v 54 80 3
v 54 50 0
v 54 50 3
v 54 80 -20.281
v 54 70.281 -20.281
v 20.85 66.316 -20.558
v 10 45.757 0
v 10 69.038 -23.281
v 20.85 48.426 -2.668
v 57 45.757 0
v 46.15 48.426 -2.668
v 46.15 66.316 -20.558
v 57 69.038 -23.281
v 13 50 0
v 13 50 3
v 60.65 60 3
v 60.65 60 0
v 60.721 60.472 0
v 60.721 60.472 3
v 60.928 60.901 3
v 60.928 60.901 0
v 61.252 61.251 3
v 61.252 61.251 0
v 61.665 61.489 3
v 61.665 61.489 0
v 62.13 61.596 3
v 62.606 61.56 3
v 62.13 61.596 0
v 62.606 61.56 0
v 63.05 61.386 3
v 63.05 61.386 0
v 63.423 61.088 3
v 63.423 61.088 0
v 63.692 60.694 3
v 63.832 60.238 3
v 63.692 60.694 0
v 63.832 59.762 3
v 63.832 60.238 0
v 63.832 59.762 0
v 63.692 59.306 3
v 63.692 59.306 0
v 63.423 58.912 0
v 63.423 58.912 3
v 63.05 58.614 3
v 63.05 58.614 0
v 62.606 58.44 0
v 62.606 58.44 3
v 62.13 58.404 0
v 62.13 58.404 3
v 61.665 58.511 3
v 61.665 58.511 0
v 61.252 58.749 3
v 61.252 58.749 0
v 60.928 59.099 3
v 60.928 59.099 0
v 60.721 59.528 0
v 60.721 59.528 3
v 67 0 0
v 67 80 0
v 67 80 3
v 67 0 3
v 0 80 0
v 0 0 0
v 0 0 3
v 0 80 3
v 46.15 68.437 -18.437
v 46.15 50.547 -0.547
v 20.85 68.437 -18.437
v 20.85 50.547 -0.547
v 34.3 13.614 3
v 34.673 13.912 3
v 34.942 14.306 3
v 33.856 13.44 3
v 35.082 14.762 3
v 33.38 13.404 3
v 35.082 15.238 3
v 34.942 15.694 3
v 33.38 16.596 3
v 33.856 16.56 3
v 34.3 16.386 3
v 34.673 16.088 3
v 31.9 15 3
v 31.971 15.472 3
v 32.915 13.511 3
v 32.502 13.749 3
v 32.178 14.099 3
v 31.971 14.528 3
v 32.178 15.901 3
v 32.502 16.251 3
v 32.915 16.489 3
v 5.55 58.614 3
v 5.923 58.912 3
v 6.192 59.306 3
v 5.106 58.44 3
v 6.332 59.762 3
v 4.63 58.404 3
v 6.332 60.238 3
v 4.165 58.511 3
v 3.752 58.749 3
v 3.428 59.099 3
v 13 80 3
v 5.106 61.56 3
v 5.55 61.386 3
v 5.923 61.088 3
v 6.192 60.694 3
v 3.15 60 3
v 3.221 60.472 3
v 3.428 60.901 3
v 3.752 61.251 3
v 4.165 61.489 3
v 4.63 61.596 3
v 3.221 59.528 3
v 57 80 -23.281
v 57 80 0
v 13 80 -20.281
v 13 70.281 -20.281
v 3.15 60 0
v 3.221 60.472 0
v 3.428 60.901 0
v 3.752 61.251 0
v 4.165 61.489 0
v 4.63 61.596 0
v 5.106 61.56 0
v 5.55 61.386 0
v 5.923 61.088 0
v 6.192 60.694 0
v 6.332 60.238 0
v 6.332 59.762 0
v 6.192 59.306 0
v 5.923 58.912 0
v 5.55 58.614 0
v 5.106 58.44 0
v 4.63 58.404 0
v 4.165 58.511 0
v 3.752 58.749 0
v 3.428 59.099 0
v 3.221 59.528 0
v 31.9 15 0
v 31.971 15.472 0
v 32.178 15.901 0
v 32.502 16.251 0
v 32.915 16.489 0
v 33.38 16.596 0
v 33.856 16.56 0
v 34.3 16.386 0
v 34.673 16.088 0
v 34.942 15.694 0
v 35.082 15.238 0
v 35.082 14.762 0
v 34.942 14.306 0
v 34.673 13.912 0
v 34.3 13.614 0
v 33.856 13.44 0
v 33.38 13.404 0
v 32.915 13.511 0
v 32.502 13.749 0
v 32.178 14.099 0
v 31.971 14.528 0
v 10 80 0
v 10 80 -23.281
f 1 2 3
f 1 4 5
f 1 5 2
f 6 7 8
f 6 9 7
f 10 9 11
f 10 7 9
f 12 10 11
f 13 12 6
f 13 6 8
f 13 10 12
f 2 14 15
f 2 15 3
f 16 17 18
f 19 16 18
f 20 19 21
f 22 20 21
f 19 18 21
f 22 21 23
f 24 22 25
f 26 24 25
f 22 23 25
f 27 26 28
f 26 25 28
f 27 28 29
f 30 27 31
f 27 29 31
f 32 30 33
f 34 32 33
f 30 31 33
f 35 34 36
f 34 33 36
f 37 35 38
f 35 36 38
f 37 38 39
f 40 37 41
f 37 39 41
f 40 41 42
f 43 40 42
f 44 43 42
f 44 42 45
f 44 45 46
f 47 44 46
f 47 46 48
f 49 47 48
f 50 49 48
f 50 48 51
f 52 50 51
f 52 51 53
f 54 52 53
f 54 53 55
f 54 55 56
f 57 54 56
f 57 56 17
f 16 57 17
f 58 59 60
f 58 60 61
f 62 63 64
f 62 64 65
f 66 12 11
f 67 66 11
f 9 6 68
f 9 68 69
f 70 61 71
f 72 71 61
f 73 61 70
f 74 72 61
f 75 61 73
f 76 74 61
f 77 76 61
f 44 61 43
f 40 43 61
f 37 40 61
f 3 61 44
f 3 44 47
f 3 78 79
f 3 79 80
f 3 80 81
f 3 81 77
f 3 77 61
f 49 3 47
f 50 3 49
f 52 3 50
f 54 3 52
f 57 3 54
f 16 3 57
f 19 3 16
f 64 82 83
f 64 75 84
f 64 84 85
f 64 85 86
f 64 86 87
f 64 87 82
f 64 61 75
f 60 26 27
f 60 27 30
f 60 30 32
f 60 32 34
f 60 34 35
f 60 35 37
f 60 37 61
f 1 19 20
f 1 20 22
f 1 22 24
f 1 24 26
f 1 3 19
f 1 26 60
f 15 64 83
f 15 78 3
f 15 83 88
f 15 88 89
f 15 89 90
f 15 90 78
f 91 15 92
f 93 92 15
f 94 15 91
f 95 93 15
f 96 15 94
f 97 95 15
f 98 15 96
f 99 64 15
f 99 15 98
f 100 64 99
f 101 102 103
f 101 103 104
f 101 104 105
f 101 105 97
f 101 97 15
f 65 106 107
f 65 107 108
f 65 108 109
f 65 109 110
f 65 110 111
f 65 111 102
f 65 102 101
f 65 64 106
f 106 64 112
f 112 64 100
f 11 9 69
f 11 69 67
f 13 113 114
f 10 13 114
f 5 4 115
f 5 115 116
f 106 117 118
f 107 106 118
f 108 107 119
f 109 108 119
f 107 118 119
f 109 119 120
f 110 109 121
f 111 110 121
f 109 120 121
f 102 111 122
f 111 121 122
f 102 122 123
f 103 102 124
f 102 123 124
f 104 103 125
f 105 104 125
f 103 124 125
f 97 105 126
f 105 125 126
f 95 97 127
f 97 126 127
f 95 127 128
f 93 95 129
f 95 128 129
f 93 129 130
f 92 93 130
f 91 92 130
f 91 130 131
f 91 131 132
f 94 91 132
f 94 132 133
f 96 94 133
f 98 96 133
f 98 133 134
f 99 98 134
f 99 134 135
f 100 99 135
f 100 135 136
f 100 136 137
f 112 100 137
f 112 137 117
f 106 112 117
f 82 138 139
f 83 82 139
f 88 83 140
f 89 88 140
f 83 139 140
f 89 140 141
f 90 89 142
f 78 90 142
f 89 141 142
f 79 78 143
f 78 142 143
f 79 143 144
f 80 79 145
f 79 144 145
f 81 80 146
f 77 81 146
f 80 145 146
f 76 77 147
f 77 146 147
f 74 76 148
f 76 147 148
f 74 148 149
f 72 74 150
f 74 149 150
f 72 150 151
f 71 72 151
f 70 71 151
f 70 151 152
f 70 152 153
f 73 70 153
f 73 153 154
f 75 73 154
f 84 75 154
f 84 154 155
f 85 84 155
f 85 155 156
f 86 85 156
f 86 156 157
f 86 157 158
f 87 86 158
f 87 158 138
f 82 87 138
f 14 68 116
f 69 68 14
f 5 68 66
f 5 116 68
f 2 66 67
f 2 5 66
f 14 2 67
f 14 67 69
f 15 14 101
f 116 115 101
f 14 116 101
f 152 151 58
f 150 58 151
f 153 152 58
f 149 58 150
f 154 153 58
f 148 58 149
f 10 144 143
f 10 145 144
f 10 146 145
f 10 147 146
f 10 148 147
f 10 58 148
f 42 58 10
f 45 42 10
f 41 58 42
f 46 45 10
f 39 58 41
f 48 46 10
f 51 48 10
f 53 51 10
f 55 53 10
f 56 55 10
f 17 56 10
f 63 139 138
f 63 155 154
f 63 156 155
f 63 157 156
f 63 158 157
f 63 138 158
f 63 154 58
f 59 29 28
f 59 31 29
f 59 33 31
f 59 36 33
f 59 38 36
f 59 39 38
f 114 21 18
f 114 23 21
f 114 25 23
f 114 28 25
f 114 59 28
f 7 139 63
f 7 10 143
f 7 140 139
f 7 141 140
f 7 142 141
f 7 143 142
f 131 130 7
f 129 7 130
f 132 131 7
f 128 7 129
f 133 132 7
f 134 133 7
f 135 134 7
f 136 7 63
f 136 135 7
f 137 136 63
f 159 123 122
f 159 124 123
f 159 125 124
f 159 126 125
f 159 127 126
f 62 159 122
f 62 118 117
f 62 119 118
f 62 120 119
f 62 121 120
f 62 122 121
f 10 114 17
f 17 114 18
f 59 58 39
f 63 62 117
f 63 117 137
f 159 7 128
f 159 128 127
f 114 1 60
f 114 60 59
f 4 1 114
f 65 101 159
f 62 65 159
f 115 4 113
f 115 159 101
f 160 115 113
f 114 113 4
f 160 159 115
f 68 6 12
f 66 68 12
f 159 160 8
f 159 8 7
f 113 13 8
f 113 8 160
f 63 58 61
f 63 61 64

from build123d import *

# Parameters (mm, degrees)
Y_KSEKLIK_EKSTR_ZYON1_DEPTH = 3
Y_KSEKLIK_EKSTR_ZYON2_DEPTH = 3
Y_KSEKLIK_EKSTR_ZYON3_DEPTH = 3
Y_KSEKLIK_EKSTR_ZYON4_DEPTH = 41
M3_BO_LUKLU_DELIK1_D        = 3.2
M3_BO_LUKLU_DELIK1_DEPTH    = 10
M3_BO_LUKLU_DELIK1_TIP      = 0.96137699
IZIM10_W                    = 25.3
IZIM10_H                    = 25.3
KES_EKSTR_ZYON1_DEPTH       = 10


with BuildPart() as part:
    # Çizim1 → Yükseklik-Ekstrüzyon1 (new body)
    with BuildSketch(Plane.XY):
        Polygon((67, 0), (0, 0), (0, 80), (10, 80), (10, 50), (57, 50), (57, 80), (67, 80), align=None)
    extrude(amount=Y_KSEKLIK_EKSTR_ZYON1_DEPTH)

    # Çizim4 → Yükseklik-Ekstrüzyon3 (add)
    with BuildSketch(Plane.ZY.offset(-57)):
        Polygon((3, 80), (-23.280562552, 80), (-23.280562552, 69.037921865), (0, 45.757359313), (3, 45.757359313), align=None)
    extrude(amount=Y_KSEKLIK_EKSTR_ZYON3_DEPTH)



with BuildPart() as body_2:
    # Çizim2 → Yükseklik-Ekstrüzyon2 (new body)
    with BuildSketch(Plane(origin=(10, 0, 0), x_dir=(0, 0, -1), z_dir=(1, 0, 0))):
        Polygon((-3, 80), (23.280562552, 80), (23.280562552, 69.037921865), (0, 45.757359313), (-3, 45.757359313), align=None)
    extrude(amount=Y_KSEKLIK_EKSTR_ZYON2_DEPTH)


with BuildPart() as part_1:
    add(part.part)

    add(body_2.part)  # Yükseklik-Ekstrüzyon4 merges body 2
    # Çizim5 → Yükseklik-Ekstrüzyon4 (add)
    with BuildSketch(Plane.ZY.offset(-54)):
        Polygon((0, 45.757359313), (-23.280562552, 69.037921865), (-23.280562552, 80), (-20.280562552, 80), (-20.280562552, 70.280562552), (0, 50), align=None)
    extrude(amount=Y_KSEKLIK_EKSTR_ZYON4_DEPTH)

    # M3 Boşluklu Delik1
    with Locations(Plane.XY.offset(3)):
        with Locations((62.25, 60), (33.5, 15), (4.75, 60)):
            Hole(M3_BO_LUKLU_DELIK1_D / 2, depth=M3_BO_LUKLU_DELIK1_DEPTH)
            with Locations((0, 0, -(M3_BO_LUKLU_DELIK1_DEPTH + M3_BO_LUKLU_DELIK1_TIP / 2))):  # 118° drill point
                Cone(0, M3_BO_LUKLU_DELIK1_D / 2, M3_BO_LUKLU_DELIK1_TIP, mode=Mode.SUBTRACT)

    # Çizim10 → Kes-Ekstrüzyon1 (cut)
    with BuildSketch(Plane(origin=(0, 22.878679656, 22.878679656), x_dir=(1, 0, 0), z_dir=(0, -0.7071067811865438, -0.7071067811865513))):
        with Locations((33.5, -48.77902636)):
            Rectangle(IZIM10_W, IZIM10_H)
    extrude(amount=-KES_EKSTR_ZYON1_DEPTH, mode=Mode.SUBTRACT)


solid = part_1.part
